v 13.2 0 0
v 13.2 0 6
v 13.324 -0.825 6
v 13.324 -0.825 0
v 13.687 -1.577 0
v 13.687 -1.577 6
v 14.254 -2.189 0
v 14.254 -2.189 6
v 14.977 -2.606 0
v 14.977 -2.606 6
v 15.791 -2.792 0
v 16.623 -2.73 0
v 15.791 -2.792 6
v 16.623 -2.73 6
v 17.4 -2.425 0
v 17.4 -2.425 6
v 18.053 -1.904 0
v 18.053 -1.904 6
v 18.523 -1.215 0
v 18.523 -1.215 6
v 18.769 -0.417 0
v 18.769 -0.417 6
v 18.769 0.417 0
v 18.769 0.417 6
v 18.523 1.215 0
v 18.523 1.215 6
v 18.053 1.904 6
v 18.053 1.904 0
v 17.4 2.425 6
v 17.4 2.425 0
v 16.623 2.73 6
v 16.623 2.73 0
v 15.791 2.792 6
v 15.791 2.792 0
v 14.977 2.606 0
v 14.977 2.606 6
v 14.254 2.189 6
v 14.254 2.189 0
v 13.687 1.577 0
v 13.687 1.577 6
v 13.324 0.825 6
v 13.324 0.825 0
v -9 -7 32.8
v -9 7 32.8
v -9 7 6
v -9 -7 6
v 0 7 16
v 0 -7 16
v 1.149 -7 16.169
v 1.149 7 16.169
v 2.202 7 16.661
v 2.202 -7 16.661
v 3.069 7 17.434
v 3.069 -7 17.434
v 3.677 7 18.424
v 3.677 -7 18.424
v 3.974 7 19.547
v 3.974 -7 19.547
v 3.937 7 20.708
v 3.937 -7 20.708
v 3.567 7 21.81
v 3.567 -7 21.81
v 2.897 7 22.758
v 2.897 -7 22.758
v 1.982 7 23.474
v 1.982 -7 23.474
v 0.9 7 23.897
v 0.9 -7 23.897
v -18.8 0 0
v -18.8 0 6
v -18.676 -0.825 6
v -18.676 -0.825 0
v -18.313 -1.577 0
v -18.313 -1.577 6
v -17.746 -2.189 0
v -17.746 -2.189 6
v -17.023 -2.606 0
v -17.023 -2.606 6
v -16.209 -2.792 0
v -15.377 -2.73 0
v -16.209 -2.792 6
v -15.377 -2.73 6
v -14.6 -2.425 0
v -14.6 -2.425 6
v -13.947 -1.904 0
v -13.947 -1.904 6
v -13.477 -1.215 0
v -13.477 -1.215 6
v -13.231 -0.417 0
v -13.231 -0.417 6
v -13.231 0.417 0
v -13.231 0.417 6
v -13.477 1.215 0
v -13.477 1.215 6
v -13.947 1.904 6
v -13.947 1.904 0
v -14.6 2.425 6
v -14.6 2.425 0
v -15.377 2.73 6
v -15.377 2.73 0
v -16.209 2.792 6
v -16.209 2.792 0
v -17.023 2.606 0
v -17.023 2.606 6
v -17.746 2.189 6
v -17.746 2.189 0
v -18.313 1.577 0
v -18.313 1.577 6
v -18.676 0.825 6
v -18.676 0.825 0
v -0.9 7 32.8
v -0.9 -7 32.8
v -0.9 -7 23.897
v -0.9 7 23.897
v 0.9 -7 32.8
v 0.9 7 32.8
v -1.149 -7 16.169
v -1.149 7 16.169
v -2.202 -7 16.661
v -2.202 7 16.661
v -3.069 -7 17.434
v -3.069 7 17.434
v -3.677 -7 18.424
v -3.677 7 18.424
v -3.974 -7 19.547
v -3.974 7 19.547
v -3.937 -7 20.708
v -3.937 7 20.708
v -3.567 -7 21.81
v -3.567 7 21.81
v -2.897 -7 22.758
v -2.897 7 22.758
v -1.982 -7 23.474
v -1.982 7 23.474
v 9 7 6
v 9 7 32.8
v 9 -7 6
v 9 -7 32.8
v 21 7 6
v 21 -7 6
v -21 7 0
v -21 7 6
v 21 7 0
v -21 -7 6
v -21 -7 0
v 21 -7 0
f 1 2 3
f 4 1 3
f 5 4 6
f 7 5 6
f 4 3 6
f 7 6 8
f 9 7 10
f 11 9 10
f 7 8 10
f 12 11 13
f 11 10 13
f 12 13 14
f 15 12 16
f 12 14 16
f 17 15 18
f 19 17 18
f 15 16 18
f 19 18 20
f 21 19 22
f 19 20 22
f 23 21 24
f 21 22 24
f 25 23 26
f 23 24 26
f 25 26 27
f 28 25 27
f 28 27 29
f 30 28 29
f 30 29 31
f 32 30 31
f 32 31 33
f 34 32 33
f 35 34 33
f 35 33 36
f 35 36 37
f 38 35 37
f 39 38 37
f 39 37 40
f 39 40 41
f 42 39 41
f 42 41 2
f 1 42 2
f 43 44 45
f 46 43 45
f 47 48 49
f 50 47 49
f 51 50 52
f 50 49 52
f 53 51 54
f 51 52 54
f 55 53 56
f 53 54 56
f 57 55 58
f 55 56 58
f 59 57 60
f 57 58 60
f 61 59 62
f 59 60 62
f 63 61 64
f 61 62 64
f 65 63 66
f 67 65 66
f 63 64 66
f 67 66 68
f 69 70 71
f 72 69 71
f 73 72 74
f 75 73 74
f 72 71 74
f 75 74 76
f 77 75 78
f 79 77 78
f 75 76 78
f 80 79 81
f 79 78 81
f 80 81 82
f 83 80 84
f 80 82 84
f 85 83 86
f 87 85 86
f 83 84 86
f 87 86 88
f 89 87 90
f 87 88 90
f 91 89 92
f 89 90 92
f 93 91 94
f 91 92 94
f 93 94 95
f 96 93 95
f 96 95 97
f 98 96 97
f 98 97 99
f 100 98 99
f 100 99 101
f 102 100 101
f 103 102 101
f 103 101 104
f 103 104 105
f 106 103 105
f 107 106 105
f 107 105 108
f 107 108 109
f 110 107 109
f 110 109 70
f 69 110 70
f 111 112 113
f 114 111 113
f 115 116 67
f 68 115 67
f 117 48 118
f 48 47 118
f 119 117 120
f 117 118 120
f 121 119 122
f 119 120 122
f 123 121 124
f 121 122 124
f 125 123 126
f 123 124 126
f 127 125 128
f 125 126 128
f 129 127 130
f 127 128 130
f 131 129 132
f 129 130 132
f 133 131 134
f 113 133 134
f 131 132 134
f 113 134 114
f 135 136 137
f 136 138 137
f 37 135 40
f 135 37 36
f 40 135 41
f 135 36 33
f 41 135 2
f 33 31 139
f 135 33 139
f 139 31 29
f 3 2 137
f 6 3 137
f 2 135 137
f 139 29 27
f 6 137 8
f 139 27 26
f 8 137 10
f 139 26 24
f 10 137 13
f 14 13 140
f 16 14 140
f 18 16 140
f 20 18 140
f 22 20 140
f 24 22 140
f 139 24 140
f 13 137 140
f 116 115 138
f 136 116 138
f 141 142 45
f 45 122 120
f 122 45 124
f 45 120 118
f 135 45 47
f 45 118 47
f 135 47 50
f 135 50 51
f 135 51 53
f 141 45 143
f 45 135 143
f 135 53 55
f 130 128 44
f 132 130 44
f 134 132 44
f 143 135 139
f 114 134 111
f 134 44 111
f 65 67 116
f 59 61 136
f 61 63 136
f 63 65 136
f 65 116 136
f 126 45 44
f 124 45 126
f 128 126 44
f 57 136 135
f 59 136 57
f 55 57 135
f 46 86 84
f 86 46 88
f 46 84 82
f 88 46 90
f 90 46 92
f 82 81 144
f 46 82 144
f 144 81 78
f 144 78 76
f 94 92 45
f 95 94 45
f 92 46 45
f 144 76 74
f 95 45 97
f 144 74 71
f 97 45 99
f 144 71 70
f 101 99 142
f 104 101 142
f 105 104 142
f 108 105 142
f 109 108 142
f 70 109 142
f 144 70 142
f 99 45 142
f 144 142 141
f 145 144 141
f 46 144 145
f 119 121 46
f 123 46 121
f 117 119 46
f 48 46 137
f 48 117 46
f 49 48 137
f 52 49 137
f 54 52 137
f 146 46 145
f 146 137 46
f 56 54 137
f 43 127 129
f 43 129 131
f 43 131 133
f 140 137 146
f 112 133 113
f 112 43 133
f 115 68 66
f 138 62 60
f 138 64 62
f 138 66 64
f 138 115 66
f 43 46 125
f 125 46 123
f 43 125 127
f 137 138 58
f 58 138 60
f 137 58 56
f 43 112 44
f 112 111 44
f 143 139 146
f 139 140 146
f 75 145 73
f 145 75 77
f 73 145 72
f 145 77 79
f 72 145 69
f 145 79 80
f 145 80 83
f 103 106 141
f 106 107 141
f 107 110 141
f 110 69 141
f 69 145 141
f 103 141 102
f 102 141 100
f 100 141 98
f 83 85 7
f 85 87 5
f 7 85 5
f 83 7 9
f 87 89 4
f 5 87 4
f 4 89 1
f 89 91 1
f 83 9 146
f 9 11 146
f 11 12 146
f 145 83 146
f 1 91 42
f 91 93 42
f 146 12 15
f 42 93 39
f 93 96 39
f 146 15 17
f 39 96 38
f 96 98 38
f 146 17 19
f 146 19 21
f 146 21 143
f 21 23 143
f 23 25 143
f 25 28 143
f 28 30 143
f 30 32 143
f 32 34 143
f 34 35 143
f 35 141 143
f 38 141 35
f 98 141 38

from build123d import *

# Parameters (mm, degrees)
PAD_DEPTH      = 7
PAD_DEPTH_BACK = 7
SKETCH720_R    = 2.8
POCKET_DEPTH   = 100


with BuildPart() as part:
    # Sketch719 → Pad (new body, two sides)
    with BuildSketch(Plane.XZ) as pad_sk:
        with BuildLine():
            Line((0.9, 32.8), (9, 32.8))
            Line((9, 32.8), (9, 6))
            Line((9, 6), (21, 6))
            Line((21, 6), (21, 0))
            Line((21, 0), (0, 0))
            Line((0, 0), (0, 16))
            ThreePointArc((0, 16), (3.974276, 19.547087), (0.9, 23.897435))
            Line((0.9, 32.8), (0.9, 23.897435))
        make_face()
    pad = extrude(amount=PAD_DEPTH) + extrude(pad_sk.sketch, amount=-PAD_DEPTH_BACK)

    # Mirrored: Pad across Sketch719 V_Axis
    add(pad.mirror(Plane(origin=(0, 0, 0), x_dir=(0, -1, 0), z_dir=(1, 0, 0))))

    # Sketch720 (on Face4 of Mirrored) → Pocket (cut)
    with BuildSketch(Plane(origin=(0, 0, 6), x_dir=(-1, 0, 0), z_dir=(0, 0, 1))):
        with Locations((16, 0)):
            Circle(SKETCH720_R)
        with Locations((-16, 0)):
            Circle(SKETCH720_R)
    extrude(amount=-POCKET_DEPTH, mode=Mode.SUBTRACT)


solid = part.part
